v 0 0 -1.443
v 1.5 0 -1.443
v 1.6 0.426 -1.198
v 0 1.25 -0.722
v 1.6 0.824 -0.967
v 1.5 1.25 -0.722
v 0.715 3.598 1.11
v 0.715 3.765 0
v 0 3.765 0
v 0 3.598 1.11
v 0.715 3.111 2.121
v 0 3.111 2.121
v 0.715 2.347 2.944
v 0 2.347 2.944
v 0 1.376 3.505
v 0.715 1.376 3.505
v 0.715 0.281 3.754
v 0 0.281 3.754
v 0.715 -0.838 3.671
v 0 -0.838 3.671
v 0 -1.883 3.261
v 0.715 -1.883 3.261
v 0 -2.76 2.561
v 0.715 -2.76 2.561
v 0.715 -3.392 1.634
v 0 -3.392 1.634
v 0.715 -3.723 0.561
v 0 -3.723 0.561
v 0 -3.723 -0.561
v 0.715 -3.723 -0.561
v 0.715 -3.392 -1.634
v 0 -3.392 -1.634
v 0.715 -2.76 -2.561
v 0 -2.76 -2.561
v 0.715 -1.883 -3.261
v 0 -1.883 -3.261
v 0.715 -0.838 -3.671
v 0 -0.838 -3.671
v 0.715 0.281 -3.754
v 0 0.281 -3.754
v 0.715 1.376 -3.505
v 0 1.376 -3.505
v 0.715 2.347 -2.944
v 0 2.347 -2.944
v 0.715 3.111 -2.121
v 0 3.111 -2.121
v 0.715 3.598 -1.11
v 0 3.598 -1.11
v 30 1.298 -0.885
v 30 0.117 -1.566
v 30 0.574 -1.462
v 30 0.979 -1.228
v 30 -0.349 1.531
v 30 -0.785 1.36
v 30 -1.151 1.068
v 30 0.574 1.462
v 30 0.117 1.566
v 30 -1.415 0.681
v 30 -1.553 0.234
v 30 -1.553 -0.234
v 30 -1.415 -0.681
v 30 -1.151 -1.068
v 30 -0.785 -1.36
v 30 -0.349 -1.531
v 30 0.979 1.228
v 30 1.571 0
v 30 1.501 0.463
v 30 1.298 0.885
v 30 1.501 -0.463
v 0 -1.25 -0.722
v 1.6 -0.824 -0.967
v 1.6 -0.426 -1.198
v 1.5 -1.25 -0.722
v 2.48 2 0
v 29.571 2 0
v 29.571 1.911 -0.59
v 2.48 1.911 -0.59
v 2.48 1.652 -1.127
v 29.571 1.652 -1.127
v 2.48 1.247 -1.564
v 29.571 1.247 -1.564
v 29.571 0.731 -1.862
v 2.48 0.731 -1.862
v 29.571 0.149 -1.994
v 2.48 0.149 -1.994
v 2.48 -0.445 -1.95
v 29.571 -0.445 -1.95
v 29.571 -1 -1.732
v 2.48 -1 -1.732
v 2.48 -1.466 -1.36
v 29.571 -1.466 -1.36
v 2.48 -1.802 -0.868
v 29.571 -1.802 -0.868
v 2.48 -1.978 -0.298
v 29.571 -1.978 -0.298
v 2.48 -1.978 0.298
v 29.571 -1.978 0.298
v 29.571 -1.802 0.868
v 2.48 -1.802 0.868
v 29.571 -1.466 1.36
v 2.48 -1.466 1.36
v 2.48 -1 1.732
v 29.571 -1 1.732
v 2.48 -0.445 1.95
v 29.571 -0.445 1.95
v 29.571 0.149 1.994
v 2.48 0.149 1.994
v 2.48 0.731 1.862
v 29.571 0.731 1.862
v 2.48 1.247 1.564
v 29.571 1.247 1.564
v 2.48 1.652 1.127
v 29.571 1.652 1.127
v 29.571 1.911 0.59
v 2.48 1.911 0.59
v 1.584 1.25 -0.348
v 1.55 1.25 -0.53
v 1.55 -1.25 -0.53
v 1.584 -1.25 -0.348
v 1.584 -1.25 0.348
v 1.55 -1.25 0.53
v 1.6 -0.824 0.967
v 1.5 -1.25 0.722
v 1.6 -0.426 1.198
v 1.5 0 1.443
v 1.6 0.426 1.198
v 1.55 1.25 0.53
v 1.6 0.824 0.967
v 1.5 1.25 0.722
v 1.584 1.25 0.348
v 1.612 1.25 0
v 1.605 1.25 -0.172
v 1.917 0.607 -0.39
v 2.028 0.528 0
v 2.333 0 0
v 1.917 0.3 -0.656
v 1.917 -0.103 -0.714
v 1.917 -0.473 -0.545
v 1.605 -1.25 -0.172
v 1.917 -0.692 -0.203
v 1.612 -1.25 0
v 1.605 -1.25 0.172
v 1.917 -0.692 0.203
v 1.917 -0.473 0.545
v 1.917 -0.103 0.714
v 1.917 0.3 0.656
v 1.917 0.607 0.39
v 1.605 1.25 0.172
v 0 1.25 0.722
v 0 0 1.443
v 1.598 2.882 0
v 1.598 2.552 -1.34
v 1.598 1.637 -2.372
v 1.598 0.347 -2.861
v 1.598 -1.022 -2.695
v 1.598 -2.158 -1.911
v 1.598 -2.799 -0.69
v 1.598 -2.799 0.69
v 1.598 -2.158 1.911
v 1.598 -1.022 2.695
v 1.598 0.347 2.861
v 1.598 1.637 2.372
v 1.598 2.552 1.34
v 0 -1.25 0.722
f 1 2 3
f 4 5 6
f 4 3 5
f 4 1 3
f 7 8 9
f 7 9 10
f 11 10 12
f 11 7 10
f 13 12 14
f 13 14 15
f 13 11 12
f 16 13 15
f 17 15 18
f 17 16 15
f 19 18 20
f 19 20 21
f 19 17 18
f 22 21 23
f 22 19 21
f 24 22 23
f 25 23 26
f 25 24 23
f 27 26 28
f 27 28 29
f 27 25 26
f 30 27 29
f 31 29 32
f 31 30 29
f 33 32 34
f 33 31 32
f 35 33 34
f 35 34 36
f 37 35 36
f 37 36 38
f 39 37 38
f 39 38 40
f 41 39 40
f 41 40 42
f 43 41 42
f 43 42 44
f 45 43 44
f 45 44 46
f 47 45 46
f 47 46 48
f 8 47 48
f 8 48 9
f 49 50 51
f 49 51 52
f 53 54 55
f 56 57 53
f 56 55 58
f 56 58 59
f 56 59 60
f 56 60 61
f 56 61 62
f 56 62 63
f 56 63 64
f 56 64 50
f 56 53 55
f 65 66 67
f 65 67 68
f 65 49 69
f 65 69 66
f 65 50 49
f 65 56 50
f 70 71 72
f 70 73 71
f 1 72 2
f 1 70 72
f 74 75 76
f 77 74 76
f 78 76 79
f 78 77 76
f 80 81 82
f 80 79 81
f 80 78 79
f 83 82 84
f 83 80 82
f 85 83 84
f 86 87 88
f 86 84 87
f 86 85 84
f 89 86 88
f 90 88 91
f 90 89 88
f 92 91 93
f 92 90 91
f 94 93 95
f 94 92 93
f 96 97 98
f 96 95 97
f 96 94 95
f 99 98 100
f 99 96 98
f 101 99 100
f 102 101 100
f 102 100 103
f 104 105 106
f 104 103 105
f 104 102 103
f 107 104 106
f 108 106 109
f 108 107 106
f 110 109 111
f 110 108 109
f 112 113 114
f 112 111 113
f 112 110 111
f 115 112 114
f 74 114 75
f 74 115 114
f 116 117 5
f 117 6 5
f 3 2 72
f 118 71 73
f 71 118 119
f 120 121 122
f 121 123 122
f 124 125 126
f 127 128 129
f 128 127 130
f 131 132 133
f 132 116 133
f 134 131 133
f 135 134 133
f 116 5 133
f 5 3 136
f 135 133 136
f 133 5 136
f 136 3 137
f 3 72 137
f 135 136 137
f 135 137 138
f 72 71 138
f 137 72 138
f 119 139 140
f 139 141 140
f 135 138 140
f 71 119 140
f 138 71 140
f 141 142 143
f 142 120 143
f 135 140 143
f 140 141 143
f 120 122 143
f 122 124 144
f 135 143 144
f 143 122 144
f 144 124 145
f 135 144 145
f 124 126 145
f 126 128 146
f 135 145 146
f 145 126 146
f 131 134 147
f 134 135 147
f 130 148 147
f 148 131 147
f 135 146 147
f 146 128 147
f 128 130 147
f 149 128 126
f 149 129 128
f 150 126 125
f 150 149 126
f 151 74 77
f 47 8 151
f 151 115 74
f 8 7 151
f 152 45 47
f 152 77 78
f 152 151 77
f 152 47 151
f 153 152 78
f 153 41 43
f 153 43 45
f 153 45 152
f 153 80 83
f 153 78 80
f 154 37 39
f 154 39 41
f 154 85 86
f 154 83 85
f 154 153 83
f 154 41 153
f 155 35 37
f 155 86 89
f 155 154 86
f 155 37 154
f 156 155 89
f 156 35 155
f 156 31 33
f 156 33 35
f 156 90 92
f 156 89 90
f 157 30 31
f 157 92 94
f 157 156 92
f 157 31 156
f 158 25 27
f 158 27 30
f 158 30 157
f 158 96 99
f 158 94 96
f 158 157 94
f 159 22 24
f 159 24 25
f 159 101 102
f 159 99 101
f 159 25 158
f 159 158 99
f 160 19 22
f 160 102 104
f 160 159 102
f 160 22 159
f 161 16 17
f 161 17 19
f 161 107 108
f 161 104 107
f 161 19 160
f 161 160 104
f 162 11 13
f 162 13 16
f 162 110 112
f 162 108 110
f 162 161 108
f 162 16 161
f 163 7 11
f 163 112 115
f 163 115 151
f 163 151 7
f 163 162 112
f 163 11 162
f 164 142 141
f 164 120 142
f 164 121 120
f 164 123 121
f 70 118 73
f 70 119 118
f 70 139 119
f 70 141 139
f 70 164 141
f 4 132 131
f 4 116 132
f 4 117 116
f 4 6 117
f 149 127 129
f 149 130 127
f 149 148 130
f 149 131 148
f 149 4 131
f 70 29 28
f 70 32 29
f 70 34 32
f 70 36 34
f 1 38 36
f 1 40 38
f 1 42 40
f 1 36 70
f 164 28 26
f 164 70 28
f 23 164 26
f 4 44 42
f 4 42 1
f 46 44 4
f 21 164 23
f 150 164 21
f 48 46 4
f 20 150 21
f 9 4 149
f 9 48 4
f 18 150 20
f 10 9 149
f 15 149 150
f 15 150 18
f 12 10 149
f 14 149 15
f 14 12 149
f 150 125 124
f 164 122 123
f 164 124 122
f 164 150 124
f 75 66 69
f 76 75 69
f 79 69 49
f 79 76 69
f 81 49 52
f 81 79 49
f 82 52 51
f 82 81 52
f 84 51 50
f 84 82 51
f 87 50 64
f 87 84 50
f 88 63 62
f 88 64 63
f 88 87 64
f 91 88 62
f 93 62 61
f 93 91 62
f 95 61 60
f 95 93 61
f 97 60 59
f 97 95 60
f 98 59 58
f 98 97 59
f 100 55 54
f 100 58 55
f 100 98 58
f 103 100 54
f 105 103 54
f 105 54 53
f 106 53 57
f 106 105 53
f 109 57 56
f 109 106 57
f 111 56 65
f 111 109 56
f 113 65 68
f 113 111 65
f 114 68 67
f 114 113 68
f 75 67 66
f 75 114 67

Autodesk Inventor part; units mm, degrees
ref_plane "YZ Plane" through (0, 0, 0) normal (1, 0, 0) x (0, 1, 0)
ref_plane "XZ Plane" through (0, 0, 0) normal (0, 1, 0) x (-1, 0, 0)
sketch "Sketch1" plane through (0, 0, 0) normal (0, 0, 1) x (1, 0, 0)
  line L0 (30, 0) -> (30, 2)
  line L1 (30, 2) -> (10, 2)
  line L2 (10, 2) -> (9.5706, 2)
  line L3 (0, 3.765) -> (0, 1.4434)
  line L4 (0, 1.4434) -> (1.5, 1.4434)
  line L5 (1.5, 1.4434) -> (2.3333, 0)
  line L6 (2.3333, 0) -> (30, 0)
  line L7 (0, 3.765) -> (0.715, 3.765)
  line L8 (0.715, 3.765) -> (2.48, 2)
  line L9 (9.5706, 2) -> (2.48, 2)
  line L10 (10, 2) -> (2.48, 2) construction
  line L11 (2.48, 2) -> (2.48, 2)
  line L12 (-6, 0) -> (36, 0) projected
  line L13 (0, -0.753) -> (0, 4.518) projected
  dimension "d0" = 30
  dimension "d1" = 20
  dimension "d2" = 1.5
  dimension "d3" = 4
  dimension "d6" = 2.48
  dimension "d7" = 45
  dimension "d8" = 2.8868
  dimension "d9" = 60
  dimension "d10" = 7.53
  dimension "d11" = 4
  dimension "d12" = 0.4294
revolve "Body" add sketch "Sketch1" angle 360 about axis through (2.3333, 0, 0) along (1, 0, 0) contours L6 L5 L4 L3 L7 L8 L9 L2 L1 L0
sketch "Sketch2" plane through (0, 0, 0) normal (-1, 0, 0) x (0, 0, 1)
  circle A0 centre (0, 0) radius 1.4434 projected
  line L0 (0, -5.271) -> (0, 5.271) projected
  line L1 (-5.271, 0) -> (5.271, 0) projected
  line L2 (1.4434, 0) -> (0.7217, -1.25)
  line L3 (0.7217, -1.25) -> (-0.7217, -1.25)
  line L4 (-0.7217, -1.25) -> (-1.4434, 0)
  line L5 (-1.4434, 0) -> (-0.7217, 1.25)
  line L6 (-0.7217, 1.25) -> (0.7217, 1.25)
  line L7 (0.7217, 1.25) -> (1.4434, 0)
  point P0 (0, 1.4434)
extrude "Slot" add sketch "Sketch2" against normal up to next contours L7 A0 | A0 L2 | L6 L0 A0 | A0 L0 L3 | L0 L6 A0 | A0 L3 L0 | L4 A0 | A0 L5
thread "Thread" size "M4x0.7" class "6g" standard "ISO Metric profile" length 20
chamfer "Chamfer1" distance 0.4294 distance2 0.4294 1 edges at (30, -2, 0) measured on face at (30, -0.4796, 0.6016)
ref_plane "Work Plane1" through (104.775, 0, 0) normal (0, 0, -1) x (1, 0, 0)
equation "\"d15\" = GEL"
equation "\"d17\" = -0.5 * SPD + 0.5 * GD"
equation "\"d18\" = GUL"
equation "\"d0\" = NLG"
equation "\"d1\" = GEL"
equation "\"d2\" = INTI"
equation "\"d3\" = GD"
equation "\"d6\" = KOH"
equation "\"d7\" = 0.5 * SEWI"
equation "\"d8\" = 1.1547 * SW"
equation "\"d10\" = KOD"
equation "\"d11\" = BDM"
equation "\"d12\" = GAL"
equation "\"NLG\" = 30"
equation "\"INTI\" = 1.5"
equation "\"GEL\" = 20"
equation "\"GAL\" = 0.61345 * PTC"
equation "\"KOH\" = 2.48"
equation "\"KOD\" = 7.53"
equation "\"GUL\" = 0.61345 * PTC"
equation "\"SPD\" = NND - 1.2269 * PTC"
equation "\"BDM\" = NND"
equation "\"GD\" = NND"
equation "\"SEWI\" = 90deg"
equation "\"SW\" = 2.5"
equation "\"TOA\" = 30deg"
equation "\"GD1\" = THREADDIA - 1.2269 * PTC"
equation "\"EPV\" = 4.48"
equation "\"THREADDIA\" = 4"
equation "\"PTC\" = 0.7"
equation "\"NND\" = 4"
equation "\"E0\" = 1.155 * SW"
properties part number "DIN 7991 - M4  x  30" material "Steel, Mild"
